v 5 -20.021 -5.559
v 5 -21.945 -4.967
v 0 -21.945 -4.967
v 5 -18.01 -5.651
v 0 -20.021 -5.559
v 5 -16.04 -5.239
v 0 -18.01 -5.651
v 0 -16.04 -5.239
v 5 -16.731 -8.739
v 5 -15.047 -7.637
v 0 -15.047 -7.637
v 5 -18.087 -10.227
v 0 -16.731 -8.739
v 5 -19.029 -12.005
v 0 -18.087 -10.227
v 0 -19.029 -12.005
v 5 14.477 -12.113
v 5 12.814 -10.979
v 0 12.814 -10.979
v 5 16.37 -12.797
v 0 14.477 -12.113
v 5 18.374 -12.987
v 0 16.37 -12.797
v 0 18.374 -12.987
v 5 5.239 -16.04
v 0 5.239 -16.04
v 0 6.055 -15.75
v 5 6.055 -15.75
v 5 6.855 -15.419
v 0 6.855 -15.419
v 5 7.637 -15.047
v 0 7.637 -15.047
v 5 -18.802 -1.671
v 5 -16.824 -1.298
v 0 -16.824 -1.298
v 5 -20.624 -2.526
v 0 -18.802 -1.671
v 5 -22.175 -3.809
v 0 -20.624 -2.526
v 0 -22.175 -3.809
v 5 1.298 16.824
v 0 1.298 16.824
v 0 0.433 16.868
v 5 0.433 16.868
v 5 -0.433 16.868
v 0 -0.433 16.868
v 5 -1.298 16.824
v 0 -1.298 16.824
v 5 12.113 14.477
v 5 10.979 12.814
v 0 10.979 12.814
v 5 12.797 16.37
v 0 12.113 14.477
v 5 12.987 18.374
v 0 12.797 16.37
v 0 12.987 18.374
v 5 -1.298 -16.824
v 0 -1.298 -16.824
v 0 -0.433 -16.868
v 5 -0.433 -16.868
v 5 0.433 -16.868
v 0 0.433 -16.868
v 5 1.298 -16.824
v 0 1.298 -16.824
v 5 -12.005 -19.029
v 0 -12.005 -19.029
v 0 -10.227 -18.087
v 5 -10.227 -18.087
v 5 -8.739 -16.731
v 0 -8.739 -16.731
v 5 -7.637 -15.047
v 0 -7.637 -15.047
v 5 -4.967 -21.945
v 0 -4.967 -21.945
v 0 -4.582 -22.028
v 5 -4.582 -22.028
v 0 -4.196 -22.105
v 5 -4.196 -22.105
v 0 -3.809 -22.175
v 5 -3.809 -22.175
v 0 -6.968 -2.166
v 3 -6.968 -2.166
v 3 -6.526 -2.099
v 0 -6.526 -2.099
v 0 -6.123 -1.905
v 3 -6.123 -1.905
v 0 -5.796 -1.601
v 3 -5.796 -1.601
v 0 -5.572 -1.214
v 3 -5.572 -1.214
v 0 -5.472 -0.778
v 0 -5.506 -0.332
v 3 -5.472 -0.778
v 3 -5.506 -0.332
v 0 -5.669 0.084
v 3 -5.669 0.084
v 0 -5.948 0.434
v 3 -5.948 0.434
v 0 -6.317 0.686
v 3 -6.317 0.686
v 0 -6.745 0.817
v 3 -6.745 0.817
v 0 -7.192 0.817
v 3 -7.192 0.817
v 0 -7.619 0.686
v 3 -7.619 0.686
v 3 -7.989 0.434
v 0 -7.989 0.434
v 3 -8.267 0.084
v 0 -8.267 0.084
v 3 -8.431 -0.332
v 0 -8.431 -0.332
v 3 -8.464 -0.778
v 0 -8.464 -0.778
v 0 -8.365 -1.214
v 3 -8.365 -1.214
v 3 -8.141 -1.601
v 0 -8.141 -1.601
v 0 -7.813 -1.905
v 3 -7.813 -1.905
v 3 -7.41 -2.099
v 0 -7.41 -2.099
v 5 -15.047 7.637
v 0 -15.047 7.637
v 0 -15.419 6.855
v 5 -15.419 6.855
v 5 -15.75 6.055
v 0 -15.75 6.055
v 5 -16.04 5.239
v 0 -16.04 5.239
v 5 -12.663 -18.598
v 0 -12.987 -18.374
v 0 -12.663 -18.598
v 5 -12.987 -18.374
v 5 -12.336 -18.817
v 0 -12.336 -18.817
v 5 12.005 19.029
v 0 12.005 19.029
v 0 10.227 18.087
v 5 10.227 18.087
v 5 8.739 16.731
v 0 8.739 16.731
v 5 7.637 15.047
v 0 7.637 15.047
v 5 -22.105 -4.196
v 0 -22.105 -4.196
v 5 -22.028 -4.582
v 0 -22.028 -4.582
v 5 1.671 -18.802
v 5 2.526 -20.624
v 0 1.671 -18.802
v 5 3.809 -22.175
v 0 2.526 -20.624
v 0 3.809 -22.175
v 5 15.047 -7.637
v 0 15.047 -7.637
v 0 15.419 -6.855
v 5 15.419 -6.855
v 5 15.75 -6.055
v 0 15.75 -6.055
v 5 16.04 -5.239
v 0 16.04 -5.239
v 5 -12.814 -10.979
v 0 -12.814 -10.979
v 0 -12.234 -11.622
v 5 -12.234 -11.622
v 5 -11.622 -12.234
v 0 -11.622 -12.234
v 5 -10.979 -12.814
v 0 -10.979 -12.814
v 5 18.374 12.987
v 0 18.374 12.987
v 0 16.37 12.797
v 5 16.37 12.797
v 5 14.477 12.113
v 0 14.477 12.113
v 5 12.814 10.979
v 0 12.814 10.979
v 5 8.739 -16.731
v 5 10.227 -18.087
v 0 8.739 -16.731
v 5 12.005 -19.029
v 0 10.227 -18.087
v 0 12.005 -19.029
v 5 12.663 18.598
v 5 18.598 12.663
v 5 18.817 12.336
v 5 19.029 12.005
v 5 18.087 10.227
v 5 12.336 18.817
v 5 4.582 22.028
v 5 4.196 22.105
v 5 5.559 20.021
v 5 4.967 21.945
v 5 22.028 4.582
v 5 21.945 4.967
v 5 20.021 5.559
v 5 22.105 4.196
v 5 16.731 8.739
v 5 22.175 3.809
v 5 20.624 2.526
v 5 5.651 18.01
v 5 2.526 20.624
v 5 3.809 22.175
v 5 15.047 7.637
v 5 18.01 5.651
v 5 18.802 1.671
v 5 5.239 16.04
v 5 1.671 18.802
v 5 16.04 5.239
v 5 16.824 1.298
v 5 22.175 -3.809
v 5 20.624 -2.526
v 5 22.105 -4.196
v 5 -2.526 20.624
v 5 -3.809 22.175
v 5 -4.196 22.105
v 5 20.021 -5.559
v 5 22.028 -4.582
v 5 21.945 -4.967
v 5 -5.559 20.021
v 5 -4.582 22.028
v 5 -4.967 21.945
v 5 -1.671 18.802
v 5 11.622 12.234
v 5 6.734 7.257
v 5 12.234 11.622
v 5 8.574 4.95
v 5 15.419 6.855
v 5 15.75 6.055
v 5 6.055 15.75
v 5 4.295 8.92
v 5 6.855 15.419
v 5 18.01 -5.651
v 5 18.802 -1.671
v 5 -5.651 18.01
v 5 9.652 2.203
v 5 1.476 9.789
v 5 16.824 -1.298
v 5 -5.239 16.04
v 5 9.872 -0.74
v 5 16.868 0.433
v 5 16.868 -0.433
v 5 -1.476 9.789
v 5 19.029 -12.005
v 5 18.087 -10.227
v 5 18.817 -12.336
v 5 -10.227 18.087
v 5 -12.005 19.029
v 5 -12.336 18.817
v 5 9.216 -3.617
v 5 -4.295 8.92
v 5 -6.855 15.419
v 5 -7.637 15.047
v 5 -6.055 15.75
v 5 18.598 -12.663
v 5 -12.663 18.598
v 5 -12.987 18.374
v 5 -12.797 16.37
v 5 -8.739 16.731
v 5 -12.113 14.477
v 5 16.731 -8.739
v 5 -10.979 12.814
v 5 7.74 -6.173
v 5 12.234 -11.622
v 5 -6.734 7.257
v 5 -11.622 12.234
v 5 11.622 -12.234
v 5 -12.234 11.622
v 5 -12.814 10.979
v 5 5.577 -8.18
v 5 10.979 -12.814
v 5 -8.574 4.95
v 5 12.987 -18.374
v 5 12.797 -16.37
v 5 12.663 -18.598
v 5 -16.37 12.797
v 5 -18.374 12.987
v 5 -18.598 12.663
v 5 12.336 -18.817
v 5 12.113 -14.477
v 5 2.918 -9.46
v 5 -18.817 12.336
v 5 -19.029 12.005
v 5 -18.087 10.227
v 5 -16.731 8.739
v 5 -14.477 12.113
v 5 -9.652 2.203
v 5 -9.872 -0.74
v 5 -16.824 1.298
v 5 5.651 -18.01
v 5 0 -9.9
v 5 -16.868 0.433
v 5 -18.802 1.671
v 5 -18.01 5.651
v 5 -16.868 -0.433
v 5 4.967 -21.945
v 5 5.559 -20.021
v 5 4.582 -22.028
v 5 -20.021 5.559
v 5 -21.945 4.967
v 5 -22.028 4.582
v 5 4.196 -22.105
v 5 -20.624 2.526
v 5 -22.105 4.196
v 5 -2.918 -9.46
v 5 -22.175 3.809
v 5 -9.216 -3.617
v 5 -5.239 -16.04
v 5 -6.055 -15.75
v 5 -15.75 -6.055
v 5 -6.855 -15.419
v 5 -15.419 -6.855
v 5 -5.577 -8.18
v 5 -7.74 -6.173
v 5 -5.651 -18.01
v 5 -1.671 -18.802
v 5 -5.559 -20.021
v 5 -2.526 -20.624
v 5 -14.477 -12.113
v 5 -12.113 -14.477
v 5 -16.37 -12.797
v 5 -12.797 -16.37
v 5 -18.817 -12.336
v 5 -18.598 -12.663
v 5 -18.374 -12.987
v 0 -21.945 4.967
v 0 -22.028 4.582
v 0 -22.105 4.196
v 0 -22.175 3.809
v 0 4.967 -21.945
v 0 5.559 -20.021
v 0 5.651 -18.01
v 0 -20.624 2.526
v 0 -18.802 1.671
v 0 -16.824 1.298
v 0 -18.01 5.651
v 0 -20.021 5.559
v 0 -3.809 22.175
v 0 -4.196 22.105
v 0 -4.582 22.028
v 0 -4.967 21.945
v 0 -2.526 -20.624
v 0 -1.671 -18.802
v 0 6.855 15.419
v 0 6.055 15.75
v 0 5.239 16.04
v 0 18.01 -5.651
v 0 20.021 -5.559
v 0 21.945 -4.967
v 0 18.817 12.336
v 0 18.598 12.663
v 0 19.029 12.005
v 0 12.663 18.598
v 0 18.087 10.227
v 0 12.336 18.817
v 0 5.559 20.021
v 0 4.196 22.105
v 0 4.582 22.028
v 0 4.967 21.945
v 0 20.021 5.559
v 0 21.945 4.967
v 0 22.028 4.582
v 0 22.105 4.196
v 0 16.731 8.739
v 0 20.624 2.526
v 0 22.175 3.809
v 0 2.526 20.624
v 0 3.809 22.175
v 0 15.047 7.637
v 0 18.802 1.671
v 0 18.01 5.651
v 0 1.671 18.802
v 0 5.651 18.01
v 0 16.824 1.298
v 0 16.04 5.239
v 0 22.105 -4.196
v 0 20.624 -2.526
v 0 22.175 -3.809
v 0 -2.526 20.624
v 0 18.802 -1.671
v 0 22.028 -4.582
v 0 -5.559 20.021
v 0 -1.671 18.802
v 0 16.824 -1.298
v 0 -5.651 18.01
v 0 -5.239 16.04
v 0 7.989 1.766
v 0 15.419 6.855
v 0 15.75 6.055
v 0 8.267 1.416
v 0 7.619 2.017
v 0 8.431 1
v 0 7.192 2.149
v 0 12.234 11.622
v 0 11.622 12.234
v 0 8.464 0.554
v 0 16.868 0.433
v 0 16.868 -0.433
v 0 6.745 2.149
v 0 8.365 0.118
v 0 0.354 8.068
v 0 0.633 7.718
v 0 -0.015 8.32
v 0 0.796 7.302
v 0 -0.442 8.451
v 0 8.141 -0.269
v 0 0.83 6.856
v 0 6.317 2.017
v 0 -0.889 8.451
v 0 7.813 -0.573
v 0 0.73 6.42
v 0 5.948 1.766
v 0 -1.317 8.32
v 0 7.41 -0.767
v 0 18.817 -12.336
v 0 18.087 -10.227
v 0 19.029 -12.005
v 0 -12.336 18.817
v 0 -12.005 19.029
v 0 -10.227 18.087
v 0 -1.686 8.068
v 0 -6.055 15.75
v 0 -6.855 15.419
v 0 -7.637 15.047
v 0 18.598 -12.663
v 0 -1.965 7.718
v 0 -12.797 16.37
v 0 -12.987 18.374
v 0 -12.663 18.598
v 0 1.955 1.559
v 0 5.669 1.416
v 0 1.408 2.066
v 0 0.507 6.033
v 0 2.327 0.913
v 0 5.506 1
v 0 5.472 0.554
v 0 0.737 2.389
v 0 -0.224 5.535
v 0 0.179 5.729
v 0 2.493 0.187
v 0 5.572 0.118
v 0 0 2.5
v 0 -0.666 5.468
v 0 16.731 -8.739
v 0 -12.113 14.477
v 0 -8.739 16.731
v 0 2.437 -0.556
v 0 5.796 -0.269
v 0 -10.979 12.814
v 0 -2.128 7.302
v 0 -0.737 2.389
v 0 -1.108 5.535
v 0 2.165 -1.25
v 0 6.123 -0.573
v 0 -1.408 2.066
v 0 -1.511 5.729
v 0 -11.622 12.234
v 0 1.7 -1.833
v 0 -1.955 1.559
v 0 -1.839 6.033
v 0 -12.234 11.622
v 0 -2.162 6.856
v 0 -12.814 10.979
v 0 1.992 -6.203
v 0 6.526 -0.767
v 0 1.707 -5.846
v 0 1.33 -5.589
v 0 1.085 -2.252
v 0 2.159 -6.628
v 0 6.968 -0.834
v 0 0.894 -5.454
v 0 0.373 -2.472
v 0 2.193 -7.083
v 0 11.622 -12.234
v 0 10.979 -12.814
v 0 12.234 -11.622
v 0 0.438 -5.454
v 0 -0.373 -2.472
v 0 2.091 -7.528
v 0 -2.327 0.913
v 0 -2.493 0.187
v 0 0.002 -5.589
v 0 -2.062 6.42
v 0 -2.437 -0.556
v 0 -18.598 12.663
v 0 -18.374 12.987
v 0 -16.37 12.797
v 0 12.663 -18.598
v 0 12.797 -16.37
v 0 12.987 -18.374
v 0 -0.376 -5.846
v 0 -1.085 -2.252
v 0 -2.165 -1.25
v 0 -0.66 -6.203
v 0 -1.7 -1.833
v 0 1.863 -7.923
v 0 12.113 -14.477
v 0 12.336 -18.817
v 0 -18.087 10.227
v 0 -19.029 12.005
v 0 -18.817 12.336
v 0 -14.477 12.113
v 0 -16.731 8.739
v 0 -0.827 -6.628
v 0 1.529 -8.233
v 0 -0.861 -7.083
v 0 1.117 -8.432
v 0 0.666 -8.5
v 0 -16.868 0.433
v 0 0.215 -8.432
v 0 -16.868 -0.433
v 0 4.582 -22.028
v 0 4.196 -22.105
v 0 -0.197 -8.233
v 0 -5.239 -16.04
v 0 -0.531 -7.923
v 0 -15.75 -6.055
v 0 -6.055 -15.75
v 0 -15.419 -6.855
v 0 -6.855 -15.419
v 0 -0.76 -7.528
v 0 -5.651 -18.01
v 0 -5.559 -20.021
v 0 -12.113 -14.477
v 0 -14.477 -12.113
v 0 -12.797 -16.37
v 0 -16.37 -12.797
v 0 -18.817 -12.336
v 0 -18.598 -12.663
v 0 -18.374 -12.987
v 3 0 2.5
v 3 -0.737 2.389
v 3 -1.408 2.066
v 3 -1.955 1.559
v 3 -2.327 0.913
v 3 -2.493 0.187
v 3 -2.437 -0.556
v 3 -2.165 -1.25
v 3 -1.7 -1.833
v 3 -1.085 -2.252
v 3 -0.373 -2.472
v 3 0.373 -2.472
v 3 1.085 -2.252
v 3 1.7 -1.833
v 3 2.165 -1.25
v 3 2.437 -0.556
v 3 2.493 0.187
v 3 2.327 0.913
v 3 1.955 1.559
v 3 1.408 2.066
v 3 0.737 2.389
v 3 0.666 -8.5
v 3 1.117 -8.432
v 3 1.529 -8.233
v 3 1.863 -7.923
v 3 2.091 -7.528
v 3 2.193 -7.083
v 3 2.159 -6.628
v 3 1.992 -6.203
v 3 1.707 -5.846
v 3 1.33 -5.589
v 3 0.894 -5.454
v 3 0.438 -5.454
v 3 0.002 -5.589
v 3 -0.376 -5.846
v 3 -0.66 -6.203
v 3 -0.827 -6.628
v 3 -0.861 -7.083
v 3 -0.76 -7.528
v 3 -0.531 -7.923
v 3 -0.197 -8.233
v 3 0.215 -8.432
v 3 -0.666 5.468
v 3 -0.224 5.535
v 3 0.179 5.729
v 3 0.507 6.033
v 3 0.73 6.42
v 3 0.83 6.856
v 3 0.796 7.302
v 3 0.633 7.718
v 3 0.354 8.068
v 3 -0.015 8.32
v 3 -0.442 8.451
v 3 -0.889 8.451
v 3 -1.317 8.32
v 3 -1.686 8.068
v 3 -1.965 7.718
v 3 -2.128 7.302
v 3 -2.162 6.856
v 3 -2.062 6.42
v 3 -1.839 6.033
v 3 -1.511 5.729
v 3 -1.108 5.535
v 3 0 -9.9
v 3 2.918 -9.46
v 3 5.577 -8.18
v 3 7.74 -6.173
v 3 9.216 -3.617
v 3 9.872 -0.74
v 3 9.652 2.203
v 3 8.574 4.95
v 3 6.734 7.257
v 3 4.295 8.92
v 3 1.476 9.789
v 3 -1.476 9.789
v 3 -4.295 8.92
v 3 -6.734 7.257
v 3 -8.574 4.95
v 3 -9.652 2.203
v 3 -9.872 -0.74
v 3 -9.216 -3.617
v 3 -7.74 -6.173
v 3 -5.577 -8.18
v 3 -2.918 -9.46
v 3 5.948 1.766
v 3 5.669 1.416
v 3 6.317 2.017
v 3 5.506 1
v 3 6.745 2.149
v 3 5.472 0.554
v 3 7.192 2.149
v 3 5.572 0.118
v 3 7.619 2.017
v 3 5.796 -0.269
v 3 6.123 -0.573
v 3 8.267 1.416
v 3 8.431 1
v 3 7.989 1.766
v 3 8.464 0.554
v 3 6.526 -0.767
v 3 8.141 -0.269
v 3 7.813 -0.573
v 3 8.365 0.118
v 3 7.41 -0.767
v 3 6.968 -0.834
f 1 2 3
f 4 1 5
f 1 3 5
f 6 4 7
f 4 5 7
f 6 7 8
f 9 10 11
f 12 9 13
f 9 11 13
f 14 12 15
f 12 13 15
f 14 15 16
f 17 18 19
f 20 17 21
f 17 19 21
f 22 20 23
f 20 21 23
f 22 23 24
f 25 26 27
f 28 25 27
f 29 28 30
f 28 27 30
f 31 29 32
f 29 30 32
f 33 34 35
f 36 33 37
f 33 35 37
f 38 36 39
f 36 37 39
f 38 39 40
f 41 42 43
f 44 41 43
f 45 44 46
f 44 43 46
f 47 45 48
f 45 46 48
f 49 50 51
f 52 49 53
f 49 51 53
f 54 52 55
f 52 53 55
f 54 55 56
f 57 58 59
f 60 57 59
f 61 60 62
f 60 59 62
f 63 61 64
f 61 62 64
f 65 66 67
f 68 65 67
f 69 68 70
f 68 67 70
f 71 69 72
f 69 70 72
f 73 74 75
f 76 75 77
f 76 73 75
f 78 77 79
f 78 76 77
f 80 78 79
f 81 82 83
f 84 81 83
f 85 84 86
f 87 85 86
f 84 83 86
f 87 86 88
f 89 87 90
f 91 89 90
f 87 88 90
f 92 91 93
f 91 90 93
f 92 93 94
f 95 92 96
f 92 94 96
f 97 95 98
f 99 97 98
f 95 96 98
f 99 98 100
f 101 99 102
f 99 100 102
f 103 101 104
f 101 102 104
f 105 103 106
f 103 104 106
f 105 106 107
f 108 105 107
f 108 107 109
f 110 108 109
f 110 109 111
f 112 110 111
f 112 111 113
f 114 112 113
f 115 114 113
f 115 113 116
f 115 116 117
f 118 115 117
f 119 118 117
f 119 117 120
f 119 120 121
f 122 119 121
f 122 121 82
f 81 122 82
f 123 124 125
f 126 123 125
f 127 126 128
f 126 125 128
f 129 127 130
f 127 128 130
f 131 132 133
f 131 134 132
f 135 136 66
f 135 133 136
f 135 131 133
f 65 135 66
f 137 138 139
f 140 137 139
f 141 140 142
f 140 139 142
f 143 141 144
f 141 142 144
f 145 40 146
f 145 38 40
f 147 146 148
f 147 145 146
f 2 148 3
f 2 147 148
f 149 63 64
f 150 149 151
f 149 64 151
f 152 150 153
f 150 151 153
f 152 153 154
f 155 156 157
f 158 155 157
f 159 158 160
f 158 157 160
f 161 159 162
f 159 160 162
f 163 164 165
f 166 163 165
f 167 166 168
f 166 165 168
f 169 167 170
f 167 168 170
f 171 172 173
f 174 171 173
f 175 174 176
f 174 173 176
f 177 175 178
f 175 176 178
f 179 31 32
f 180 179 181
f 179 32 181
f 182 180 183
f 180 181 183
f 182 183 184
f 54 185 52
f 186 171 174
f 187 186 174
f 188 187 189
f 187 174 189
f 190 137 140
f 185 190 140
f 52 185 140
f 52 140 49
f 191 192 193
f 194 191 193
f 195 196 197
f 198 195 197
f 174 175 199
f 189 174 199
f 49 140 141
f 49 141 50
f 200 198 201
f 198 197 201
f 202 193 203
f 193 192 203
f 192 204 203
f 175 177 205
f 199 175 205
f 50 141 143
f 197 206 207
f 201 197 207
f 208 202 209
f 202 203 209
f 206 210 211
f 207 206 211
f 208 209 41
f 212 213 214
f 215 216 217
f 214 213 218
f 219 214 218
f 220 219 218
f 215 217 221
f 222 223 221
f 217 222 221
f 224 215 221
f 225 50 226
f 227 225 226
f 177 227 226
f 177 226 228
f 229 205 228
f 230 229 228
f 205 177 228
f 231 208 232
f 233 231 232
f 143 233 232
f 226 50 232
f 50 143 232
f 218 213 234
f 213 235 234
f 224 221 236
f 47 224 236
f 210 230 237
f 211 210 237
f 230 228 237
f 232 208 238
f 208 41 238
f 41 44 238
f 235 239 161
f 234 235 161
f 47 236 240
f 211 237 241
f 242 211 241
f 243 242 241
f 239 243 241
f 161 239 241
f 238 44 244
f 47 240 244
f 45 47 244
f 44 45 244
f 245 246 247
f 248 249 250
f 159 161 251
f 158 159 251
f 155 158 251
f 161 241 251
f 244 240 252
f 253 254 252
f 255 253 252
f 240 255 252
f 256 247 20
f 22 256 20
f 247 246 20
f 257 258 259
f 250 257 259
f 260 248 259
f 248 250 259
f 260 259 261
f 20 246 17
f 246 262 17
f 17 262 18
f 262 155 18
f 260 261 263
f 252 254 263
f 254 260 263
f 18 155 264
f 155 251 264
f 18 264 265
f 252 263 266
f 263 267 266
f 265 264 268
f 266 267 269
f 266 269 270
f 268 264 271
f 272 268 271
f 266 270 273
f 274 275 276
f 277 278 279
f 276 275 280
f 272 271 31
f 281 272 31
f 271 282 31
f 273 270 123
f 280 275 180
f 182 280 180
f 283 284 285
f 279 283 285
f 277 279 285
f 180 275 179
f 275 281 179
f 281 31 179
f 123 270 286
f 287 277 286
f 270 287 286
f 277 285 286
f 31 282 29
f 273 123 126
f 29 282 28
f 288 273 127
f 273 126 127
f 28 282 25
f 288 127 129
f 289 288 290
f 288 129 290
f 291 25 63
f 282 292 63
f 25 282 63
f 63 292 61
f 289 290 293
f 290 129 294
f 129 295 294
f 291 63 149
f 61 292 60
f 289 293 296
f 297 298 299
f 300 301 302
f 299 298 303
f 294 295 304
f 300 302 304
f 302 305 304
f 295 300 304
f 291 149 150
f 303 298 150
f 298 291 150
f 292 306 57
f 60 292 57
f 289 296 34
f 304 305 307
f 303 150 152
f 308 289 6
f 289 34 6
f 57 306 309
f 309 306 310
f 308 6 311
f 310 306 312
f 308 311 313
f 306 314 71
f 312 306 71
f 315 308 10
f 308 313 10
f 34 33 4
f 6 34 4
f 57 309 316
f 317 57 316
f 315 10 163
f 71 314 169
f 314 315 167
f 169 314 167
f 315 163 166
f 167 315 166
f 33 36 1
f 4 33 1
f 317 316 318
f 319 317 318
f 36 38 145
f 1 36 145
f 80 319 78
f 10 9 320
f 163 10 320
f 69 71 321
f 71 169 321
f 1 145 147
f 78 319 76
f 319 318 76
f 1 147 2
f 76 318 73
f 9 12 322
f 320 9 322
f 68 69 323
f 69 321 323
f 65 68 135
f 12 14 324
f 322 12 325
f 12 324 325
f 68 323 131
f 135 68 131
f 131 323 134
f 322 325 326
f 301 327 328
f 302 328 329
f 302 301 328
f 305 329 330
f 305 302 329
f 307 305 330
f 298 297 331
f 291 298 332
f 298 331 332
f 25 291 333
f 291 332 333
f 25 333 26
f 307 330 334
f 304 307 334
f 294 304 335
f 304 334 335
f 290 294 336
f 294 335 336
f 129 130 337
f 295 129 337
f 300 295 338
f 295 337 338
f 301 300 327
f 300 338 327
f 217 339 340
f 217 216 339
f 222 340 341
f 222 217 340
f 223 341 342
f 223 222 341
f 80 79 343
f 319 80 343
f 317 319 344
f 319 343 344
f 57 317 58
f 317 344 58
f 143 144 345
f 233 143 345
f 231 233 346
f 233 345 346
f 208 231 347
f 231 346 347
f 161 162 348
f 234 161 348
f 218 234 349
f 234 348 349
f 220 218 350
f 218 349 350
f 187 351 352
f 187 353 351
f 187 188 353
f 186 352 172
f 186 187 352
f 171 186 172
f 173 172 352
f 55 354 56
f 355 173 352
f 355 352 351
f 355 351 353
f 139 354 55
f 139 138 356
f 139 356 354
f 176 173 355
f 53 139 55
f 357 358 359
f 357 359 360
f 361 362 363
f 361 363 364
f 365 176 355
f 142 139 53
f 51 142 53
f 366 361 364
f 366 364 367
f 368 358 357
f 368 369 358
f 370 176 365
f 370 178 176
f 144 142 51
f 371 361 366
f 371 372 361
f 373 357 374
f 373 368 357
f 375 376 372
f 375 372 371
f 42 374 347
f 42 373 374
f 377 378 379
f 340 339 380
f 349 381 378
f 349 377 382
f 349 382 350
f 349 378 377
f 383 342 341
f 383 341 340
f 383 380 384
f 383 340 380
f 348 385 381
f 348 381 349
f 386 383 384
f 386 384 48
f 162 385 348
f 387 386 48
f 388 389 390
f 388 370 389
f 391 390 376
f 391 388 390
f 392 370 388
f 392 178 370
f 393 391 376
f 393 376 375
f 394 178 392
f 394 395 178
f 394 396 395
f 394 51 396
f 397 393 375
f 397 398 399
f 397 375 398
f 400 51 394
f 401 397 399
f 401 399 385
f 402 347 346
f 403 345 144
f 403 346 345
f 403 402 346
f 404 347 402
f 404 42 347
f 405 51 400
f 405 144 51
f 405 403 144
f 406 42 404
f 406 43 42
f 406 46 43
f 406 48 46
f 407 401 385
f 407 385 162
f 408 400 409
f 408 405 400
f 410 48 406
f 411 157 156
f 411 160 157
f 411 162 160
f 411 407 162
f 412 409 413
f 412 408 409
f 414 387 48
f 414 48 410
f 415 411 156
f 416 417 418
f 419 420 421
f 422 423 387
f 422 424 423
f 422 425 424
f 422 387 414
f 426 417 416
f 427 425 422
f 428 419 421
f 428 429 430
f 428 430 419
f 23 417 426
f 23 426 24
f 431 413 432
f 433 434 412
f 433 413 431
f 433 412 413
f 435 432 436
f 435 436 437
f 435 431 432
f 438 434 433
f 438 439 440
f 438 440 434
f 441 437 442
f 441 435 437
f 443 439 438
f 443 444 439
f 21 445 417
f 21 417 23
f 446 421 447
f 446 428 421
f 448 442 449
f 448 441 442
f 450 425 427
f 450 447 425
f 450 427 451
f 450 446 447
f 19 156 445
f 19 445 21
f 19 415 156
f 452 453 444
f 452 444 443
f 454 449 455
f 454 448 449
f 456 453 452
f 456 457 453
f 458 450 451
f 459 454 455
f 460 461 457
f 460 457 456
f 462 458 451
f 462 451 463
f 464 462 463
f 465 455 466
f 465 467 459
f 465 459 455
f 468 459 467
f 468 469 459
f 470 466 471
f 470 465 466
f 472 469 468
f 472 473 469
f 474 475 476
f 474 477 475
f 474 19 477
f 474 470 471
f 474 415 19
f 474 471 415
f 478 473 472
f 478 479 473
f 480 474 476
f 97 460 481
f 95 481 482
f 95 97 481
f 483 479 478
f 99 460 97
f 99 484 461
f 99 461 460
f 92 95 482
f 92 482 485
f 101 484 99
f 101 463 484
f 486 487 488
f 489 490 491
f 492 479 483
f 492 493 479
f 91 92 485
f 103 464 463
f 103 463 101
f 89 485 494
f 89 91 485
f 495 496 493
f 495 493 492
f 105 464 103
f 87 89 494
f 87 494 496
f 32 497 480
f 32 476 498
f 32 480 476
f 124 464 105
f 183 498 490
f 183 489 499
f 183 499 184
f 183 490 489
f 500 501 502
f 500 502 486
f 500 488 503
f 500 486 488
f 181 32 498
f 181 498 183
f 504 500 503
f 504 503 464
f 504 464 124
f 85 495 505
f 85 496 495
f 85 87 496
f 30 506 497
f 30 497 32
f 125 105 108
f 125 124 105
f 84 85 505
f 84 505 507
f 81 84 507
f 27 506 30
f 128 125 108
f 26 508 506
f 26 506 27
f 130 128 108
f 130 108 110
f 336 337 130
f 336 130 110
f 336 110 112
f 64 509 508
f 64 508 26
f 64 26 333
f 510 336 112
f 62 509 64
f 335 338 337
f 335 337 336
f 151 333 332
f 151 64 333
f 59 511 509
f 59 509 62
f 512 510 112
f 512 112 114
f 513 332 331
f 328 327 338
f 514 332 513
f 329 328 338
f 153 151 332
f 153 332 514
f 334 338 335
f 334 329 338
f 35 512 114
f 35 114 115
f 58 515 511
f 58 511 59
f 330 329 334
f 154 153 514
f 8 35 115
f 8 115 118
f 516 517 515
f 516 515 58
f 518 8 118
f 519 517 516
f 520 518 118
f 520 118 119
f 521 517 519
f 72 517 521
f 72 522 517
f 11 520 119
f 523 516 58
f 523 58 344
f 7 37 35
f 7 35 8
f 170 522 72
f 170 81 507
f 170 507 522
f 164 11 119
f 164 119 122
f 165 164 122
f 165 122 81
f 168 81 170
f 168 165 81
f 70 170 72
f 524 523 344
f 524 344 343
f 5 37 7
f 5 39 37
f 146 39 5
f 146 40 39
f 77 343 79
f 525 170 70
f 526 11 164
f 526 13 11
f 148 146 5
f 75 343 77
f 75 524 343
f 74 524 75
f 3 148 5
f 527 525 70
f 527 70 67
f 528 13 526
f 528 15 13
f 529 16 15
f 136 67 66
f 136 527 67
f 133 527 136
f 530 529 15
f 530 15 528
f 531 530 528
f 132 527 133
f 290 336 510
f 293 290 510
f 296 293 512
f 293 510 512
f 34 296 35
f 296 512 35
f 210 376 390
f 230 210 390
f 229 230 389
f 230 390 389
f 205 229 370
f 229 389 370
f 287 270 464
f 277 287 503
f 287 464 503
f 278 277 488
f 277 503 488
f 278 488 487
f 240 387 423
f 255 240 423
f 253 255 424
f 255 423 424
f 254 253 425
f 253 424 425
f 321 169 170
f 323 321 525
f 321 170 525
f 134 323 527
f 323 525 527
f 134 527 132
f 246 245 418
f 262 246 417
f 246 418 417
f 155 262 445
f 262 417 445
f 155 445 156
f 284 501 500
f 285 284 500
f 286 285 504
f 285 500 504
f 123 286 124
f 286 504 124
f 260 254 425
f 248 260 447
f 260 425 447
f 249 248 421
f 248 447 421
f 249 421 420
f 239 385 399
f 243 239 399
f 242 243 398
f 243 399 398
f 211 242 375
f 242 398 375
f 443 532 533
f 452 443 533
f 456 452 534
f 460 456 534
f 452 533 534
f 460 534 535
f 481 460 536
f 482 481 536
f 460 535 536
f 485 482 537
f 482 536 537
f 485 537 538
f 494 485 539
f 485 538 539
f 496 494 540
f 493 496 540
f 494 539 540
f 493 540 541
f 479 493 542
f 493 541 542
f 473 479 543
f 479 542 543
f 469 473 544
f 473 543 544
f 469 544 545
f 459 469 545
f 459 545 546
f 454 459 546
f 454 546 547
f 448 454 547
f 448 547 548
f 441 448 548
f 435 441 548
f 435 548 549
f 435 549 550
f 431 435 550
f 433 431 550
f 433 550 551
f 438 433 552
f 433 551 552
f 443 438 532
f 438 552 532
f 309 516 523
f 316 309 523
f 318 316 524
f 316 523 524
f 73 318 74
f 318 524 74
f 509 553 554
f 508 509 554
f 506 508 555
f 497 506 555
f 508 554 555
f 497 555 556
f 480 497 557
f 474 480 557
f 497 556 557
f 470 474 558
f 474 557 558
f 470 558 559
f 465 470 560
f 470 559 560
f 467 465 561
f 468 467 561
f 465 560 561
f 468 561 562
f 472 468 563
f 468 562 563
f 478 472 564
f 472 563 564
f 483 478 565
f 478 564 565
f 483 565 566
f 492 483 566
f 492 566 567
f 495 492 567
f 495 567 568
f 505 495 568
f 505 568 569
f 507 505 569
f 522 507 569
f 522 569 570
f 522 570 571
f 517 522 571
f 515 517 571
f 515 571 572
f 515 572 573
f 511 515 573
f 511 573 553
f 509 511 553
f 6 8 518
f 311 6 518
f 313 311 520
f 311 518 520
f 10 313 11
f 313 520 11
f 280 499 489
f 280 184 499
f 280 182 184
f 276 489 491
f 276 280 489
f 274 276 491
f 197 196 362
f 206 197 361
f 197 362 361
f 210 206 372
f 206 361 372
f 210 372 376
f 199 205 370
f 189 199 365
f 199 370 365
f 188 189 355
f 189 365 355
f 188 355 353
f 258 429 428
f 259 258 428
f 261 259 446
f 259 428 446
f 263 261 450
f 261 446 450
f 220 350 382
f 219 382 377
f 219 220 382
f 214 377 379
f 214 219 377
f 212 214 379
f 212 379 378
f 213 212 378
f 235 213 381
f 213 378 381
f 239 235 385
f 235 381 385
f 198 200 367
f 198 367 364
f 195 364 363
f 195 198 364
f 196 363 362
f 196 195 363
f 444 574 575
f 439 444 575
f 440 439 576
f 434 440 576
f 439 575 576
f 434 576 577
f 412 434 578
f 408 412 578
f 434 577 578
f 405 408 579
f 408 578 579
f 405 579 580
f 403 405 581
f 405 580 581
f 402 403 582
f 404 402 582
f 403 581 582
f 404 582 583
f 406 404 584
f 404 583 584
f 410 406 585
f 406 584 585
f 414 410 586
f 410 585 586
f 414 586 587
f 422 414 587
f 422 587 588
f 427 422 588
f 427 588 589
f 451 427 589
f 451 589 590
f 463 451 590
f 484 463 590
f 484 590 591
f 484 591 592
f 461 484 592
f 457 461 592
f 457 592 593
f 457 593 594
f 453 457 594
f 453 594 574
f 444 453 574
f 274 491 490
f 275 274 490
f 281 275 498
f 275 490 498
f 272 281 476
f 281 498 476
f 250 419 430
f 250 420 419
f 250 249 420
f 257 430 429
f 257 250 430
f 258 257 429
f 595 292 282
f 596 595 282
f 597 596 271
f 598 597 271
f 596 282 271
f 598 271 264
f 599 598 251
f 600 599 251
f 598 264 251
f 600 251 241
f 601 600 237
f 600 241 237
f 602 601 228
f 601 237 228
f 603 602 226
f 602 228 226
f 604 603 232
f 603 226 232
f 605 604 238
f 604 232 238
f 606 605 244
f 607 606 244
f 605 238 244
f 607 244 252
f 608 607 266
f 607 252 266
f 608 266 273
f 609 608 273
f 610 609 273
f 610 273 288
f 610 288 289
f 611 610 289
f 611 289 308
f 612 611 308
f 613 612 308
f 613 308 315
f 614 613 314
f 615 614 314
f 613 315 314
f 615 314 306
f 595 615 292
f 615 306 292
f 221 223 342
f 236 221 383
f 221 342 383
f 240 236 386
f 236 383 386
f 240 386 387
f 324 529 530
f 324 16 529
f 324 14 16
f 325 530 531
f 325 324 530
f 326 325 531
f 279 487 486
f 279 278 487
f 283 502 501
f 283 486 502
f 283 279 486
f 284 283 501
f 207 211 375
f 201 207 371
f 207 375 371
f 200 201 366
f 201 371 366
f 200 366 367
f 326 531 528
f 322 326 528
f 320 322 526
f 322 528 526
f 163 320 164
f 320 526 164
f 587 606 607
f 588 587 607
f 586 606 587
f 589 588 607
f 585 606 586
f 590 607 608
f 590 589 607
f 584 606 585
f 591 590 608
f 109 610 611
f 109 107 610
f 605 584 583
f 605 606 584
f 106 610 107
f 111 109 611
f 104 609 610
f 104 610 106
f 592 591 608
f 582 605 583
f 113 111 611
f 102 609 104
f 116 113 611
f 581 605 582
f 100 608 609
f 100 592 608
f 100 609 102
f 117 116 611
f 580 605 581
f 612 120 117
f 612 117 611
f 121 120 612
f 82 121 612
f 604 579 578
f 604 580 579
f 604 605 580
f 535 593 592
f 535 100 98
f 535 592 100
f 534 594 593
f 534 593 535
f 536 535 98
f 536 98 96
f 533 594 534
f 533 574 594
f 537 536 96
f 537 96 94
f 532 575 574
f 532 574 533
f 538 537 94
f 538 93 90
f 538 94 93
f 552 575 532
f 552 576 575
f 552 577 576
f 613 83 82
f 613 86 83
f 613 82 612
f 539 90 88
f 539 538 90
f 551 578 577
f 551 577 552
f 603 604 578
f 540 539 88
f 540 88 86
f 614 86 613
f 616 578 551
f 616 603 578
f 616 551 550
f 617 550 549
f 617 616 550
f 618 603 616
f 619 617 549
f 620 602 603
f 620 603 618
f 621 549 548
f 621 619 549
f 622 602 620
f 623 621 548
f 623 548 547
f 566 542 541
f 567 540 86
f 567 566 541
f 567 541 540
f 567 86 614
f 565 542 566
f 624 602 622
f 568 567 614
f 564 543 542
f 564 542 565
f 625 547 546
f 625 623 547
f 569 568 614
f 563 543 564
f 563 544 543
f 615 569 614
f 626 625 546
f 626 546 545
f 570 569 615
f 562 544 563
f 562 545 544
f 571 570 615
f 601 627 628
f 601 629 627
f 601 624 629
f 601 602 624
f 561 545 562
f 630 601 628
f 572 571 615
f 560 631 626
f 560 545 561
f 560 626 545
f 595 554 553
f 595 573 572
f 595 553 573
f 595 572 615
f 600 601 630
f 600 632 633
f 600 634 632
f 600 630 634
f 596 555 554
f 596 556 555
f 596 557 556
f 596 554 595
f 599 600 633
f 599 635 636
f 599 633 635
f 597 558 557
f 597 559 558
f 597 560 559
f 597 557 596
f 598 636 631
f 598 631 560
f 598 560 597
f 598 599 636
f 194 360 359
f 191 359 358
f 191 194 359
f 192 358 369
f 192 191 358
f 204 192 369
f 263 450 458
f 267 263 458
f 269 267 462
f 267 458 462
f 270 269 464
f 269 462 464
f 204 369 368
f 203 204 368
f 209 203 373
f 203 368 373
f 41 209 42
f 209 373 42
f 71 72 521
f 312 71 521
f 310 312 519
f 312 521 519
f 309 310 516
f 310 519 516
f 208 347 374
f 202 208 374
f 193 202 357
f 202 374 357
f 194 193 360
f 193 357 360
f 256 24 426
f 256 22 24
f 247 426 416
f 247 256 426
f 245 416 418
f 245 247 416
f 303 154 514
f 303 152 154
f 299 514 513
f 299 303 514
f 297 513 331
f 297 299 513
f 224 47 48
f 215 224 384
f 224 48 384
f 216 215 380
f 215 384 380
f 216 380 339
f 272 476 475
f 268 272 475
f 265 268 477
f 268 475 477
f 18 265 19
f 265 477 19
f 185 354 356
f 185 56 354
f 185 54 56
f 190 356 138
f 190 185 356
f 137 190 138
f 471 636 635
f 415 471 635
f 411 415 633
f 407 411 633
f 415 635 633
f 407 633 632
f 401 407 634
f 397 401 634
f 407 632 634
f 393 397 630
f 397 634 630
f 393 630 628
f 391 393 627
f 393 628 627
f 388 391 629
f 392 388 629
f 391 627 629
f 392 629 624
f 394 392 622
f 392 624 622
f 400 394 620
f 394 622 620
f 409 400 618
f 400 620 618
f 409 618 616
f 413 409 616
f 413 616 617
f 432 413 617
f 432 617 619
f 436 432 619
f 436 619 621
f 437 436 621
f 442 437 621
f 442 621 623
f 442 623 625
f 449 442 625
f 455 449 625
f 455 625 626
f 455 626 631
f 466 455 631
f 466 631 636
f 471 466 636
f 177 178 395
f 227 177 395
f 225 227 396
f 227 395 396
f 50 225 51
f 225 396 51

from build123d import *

# Parameters (mm, degrees)
BASPROSKE_W             = 5
BASPROSKE_H             = 22.5
TOOTHCUT_DEPTH          = 33.210246817
TEETHCUTS_COUNT         = 16
TEETHCUTS_ANGLE         = 337.5
BORSKE_R                = 2.5
BORE_DEPTH              = 50.0000508
ESQUISSE1_R             = 9.9
ENL_V_MAT_EXTRU_1_DEPTH = 2
ESQUISSE2_R             = 1.5
ESQUISSE2_R_2           = 1.531300803
ENL_V_MAT_EXTRU_2_DEPTH = 32.503631705


with BuildPart() as part:
    # BasProSke → Base-Revolve (revolve)
    with BuildSketch(Plane(origin=(0, 0, 0), x_dir=(1, 0, 0), z_dir=(0, 1, 0)), mode=Mode.PRIVATE) as base_revolve_sk:
        with Locations((2.5, 11.25)):
            Rectangle(BASPROSKE_W, BASPROSKE_H)
    revolve(base_revolve_sk.sketch.rotate(Axis((-10, 0, 0), (1, 0, 0)), 180), axis=Axis((-10, 0, 0), (1, 0, 0)))

    # TooCutSke → ToothCut (cut, through all)
    with BuildSketch(Plane(origin=(0, 0, 0), x_dir=(0, 0, -1), z_dir=(1, 0, 0))):
        with BuildLine():
            ThreePointArc((1.297749273, 16.824022195), (0, 16.874), (-1.297749273, 16.824022195))
            ThreePointArc((-1.297749273, 16.824022195), (-2.047921493, 19.754510488), (-3.832565589, 22.196961192))
            ThreePointArc((-3.832565589, 22.196961192), (0, 22.5254), (3.832565589, 22.196961192))
            ThreePointArc((3.832565589, 22.196961192), (2.047921493, 19.754510488), (1.297749273, 16.824022195))
        make_face()
    toothcut = extrude(amount=TOOTHCUT_DEPTH, mode=Mode.SUBTRACT)

    # TeethCuts: ToothCut ×16 about axis
    teethcuts_axis = Axis((-10, 0, 0), (1, 0, 0))
    for i in range(1, TEETHCUTS_COUNT):
        add(toothcut.rotate(teethcuts_axis, i * TEETHCUTS_ANGLE / (TEETHCUTS_COUNT - 1)), mode=Mode.SUBTRACT)

    # BorSke → Bore (cut, symmetric)
    with BuildSketch(Plane(origin=(0, 0, 0), x_dir=(0, 0, -1), z_dir=(1, 0, 0))):
        with Locations(Location((0, 0, 0), (0, 0, 180))):
            Circle(BORSKE_R)
    extrude(amount=BORE_DEPTH, both=True, mode=Mode.SUBTRACT)

    # Esquisse1 → Enlèv. mat.-Extru.1 (cut)
    with BuildSketch(Plane(origin=(5, 0, 0), x_dir=(0, 0, -1), z_dir=(1, 0, 0))):
        Circle(ESQUISSE1_R)
    extrude(amount=-ENL_V_MAT_EXTRU_1_DEPTH, mode=Mode.SUBTRACT)

    # Esquisse2 → Enlèv. mat.-Extru.2 (cut, through all)
    with BuildSketch(Plane(origin=(3, 0, 0), x_dir=(0, 0, -1), z_dir=(1, 0, 0))):
        with Locations((-0.665922194, 6.968252839)):
            Circle(ESQUISSE2_R)
        with Locations((6.968252839, 0.665922194)):
            Circle(ESQUISSE2_R_2)
        with Locations((0.665922194, -6.968252839)):
            Circle(ESQUISSE2_R)
        with Locations((-6.968252839, -0.665922194)):
            Circle(ESQUISSE2_R)
    extrude(amount=-ENL_V_MAT_EXTRU_2_DEPTH, mode=Mode.SUBTRACT)


solid = part.part
